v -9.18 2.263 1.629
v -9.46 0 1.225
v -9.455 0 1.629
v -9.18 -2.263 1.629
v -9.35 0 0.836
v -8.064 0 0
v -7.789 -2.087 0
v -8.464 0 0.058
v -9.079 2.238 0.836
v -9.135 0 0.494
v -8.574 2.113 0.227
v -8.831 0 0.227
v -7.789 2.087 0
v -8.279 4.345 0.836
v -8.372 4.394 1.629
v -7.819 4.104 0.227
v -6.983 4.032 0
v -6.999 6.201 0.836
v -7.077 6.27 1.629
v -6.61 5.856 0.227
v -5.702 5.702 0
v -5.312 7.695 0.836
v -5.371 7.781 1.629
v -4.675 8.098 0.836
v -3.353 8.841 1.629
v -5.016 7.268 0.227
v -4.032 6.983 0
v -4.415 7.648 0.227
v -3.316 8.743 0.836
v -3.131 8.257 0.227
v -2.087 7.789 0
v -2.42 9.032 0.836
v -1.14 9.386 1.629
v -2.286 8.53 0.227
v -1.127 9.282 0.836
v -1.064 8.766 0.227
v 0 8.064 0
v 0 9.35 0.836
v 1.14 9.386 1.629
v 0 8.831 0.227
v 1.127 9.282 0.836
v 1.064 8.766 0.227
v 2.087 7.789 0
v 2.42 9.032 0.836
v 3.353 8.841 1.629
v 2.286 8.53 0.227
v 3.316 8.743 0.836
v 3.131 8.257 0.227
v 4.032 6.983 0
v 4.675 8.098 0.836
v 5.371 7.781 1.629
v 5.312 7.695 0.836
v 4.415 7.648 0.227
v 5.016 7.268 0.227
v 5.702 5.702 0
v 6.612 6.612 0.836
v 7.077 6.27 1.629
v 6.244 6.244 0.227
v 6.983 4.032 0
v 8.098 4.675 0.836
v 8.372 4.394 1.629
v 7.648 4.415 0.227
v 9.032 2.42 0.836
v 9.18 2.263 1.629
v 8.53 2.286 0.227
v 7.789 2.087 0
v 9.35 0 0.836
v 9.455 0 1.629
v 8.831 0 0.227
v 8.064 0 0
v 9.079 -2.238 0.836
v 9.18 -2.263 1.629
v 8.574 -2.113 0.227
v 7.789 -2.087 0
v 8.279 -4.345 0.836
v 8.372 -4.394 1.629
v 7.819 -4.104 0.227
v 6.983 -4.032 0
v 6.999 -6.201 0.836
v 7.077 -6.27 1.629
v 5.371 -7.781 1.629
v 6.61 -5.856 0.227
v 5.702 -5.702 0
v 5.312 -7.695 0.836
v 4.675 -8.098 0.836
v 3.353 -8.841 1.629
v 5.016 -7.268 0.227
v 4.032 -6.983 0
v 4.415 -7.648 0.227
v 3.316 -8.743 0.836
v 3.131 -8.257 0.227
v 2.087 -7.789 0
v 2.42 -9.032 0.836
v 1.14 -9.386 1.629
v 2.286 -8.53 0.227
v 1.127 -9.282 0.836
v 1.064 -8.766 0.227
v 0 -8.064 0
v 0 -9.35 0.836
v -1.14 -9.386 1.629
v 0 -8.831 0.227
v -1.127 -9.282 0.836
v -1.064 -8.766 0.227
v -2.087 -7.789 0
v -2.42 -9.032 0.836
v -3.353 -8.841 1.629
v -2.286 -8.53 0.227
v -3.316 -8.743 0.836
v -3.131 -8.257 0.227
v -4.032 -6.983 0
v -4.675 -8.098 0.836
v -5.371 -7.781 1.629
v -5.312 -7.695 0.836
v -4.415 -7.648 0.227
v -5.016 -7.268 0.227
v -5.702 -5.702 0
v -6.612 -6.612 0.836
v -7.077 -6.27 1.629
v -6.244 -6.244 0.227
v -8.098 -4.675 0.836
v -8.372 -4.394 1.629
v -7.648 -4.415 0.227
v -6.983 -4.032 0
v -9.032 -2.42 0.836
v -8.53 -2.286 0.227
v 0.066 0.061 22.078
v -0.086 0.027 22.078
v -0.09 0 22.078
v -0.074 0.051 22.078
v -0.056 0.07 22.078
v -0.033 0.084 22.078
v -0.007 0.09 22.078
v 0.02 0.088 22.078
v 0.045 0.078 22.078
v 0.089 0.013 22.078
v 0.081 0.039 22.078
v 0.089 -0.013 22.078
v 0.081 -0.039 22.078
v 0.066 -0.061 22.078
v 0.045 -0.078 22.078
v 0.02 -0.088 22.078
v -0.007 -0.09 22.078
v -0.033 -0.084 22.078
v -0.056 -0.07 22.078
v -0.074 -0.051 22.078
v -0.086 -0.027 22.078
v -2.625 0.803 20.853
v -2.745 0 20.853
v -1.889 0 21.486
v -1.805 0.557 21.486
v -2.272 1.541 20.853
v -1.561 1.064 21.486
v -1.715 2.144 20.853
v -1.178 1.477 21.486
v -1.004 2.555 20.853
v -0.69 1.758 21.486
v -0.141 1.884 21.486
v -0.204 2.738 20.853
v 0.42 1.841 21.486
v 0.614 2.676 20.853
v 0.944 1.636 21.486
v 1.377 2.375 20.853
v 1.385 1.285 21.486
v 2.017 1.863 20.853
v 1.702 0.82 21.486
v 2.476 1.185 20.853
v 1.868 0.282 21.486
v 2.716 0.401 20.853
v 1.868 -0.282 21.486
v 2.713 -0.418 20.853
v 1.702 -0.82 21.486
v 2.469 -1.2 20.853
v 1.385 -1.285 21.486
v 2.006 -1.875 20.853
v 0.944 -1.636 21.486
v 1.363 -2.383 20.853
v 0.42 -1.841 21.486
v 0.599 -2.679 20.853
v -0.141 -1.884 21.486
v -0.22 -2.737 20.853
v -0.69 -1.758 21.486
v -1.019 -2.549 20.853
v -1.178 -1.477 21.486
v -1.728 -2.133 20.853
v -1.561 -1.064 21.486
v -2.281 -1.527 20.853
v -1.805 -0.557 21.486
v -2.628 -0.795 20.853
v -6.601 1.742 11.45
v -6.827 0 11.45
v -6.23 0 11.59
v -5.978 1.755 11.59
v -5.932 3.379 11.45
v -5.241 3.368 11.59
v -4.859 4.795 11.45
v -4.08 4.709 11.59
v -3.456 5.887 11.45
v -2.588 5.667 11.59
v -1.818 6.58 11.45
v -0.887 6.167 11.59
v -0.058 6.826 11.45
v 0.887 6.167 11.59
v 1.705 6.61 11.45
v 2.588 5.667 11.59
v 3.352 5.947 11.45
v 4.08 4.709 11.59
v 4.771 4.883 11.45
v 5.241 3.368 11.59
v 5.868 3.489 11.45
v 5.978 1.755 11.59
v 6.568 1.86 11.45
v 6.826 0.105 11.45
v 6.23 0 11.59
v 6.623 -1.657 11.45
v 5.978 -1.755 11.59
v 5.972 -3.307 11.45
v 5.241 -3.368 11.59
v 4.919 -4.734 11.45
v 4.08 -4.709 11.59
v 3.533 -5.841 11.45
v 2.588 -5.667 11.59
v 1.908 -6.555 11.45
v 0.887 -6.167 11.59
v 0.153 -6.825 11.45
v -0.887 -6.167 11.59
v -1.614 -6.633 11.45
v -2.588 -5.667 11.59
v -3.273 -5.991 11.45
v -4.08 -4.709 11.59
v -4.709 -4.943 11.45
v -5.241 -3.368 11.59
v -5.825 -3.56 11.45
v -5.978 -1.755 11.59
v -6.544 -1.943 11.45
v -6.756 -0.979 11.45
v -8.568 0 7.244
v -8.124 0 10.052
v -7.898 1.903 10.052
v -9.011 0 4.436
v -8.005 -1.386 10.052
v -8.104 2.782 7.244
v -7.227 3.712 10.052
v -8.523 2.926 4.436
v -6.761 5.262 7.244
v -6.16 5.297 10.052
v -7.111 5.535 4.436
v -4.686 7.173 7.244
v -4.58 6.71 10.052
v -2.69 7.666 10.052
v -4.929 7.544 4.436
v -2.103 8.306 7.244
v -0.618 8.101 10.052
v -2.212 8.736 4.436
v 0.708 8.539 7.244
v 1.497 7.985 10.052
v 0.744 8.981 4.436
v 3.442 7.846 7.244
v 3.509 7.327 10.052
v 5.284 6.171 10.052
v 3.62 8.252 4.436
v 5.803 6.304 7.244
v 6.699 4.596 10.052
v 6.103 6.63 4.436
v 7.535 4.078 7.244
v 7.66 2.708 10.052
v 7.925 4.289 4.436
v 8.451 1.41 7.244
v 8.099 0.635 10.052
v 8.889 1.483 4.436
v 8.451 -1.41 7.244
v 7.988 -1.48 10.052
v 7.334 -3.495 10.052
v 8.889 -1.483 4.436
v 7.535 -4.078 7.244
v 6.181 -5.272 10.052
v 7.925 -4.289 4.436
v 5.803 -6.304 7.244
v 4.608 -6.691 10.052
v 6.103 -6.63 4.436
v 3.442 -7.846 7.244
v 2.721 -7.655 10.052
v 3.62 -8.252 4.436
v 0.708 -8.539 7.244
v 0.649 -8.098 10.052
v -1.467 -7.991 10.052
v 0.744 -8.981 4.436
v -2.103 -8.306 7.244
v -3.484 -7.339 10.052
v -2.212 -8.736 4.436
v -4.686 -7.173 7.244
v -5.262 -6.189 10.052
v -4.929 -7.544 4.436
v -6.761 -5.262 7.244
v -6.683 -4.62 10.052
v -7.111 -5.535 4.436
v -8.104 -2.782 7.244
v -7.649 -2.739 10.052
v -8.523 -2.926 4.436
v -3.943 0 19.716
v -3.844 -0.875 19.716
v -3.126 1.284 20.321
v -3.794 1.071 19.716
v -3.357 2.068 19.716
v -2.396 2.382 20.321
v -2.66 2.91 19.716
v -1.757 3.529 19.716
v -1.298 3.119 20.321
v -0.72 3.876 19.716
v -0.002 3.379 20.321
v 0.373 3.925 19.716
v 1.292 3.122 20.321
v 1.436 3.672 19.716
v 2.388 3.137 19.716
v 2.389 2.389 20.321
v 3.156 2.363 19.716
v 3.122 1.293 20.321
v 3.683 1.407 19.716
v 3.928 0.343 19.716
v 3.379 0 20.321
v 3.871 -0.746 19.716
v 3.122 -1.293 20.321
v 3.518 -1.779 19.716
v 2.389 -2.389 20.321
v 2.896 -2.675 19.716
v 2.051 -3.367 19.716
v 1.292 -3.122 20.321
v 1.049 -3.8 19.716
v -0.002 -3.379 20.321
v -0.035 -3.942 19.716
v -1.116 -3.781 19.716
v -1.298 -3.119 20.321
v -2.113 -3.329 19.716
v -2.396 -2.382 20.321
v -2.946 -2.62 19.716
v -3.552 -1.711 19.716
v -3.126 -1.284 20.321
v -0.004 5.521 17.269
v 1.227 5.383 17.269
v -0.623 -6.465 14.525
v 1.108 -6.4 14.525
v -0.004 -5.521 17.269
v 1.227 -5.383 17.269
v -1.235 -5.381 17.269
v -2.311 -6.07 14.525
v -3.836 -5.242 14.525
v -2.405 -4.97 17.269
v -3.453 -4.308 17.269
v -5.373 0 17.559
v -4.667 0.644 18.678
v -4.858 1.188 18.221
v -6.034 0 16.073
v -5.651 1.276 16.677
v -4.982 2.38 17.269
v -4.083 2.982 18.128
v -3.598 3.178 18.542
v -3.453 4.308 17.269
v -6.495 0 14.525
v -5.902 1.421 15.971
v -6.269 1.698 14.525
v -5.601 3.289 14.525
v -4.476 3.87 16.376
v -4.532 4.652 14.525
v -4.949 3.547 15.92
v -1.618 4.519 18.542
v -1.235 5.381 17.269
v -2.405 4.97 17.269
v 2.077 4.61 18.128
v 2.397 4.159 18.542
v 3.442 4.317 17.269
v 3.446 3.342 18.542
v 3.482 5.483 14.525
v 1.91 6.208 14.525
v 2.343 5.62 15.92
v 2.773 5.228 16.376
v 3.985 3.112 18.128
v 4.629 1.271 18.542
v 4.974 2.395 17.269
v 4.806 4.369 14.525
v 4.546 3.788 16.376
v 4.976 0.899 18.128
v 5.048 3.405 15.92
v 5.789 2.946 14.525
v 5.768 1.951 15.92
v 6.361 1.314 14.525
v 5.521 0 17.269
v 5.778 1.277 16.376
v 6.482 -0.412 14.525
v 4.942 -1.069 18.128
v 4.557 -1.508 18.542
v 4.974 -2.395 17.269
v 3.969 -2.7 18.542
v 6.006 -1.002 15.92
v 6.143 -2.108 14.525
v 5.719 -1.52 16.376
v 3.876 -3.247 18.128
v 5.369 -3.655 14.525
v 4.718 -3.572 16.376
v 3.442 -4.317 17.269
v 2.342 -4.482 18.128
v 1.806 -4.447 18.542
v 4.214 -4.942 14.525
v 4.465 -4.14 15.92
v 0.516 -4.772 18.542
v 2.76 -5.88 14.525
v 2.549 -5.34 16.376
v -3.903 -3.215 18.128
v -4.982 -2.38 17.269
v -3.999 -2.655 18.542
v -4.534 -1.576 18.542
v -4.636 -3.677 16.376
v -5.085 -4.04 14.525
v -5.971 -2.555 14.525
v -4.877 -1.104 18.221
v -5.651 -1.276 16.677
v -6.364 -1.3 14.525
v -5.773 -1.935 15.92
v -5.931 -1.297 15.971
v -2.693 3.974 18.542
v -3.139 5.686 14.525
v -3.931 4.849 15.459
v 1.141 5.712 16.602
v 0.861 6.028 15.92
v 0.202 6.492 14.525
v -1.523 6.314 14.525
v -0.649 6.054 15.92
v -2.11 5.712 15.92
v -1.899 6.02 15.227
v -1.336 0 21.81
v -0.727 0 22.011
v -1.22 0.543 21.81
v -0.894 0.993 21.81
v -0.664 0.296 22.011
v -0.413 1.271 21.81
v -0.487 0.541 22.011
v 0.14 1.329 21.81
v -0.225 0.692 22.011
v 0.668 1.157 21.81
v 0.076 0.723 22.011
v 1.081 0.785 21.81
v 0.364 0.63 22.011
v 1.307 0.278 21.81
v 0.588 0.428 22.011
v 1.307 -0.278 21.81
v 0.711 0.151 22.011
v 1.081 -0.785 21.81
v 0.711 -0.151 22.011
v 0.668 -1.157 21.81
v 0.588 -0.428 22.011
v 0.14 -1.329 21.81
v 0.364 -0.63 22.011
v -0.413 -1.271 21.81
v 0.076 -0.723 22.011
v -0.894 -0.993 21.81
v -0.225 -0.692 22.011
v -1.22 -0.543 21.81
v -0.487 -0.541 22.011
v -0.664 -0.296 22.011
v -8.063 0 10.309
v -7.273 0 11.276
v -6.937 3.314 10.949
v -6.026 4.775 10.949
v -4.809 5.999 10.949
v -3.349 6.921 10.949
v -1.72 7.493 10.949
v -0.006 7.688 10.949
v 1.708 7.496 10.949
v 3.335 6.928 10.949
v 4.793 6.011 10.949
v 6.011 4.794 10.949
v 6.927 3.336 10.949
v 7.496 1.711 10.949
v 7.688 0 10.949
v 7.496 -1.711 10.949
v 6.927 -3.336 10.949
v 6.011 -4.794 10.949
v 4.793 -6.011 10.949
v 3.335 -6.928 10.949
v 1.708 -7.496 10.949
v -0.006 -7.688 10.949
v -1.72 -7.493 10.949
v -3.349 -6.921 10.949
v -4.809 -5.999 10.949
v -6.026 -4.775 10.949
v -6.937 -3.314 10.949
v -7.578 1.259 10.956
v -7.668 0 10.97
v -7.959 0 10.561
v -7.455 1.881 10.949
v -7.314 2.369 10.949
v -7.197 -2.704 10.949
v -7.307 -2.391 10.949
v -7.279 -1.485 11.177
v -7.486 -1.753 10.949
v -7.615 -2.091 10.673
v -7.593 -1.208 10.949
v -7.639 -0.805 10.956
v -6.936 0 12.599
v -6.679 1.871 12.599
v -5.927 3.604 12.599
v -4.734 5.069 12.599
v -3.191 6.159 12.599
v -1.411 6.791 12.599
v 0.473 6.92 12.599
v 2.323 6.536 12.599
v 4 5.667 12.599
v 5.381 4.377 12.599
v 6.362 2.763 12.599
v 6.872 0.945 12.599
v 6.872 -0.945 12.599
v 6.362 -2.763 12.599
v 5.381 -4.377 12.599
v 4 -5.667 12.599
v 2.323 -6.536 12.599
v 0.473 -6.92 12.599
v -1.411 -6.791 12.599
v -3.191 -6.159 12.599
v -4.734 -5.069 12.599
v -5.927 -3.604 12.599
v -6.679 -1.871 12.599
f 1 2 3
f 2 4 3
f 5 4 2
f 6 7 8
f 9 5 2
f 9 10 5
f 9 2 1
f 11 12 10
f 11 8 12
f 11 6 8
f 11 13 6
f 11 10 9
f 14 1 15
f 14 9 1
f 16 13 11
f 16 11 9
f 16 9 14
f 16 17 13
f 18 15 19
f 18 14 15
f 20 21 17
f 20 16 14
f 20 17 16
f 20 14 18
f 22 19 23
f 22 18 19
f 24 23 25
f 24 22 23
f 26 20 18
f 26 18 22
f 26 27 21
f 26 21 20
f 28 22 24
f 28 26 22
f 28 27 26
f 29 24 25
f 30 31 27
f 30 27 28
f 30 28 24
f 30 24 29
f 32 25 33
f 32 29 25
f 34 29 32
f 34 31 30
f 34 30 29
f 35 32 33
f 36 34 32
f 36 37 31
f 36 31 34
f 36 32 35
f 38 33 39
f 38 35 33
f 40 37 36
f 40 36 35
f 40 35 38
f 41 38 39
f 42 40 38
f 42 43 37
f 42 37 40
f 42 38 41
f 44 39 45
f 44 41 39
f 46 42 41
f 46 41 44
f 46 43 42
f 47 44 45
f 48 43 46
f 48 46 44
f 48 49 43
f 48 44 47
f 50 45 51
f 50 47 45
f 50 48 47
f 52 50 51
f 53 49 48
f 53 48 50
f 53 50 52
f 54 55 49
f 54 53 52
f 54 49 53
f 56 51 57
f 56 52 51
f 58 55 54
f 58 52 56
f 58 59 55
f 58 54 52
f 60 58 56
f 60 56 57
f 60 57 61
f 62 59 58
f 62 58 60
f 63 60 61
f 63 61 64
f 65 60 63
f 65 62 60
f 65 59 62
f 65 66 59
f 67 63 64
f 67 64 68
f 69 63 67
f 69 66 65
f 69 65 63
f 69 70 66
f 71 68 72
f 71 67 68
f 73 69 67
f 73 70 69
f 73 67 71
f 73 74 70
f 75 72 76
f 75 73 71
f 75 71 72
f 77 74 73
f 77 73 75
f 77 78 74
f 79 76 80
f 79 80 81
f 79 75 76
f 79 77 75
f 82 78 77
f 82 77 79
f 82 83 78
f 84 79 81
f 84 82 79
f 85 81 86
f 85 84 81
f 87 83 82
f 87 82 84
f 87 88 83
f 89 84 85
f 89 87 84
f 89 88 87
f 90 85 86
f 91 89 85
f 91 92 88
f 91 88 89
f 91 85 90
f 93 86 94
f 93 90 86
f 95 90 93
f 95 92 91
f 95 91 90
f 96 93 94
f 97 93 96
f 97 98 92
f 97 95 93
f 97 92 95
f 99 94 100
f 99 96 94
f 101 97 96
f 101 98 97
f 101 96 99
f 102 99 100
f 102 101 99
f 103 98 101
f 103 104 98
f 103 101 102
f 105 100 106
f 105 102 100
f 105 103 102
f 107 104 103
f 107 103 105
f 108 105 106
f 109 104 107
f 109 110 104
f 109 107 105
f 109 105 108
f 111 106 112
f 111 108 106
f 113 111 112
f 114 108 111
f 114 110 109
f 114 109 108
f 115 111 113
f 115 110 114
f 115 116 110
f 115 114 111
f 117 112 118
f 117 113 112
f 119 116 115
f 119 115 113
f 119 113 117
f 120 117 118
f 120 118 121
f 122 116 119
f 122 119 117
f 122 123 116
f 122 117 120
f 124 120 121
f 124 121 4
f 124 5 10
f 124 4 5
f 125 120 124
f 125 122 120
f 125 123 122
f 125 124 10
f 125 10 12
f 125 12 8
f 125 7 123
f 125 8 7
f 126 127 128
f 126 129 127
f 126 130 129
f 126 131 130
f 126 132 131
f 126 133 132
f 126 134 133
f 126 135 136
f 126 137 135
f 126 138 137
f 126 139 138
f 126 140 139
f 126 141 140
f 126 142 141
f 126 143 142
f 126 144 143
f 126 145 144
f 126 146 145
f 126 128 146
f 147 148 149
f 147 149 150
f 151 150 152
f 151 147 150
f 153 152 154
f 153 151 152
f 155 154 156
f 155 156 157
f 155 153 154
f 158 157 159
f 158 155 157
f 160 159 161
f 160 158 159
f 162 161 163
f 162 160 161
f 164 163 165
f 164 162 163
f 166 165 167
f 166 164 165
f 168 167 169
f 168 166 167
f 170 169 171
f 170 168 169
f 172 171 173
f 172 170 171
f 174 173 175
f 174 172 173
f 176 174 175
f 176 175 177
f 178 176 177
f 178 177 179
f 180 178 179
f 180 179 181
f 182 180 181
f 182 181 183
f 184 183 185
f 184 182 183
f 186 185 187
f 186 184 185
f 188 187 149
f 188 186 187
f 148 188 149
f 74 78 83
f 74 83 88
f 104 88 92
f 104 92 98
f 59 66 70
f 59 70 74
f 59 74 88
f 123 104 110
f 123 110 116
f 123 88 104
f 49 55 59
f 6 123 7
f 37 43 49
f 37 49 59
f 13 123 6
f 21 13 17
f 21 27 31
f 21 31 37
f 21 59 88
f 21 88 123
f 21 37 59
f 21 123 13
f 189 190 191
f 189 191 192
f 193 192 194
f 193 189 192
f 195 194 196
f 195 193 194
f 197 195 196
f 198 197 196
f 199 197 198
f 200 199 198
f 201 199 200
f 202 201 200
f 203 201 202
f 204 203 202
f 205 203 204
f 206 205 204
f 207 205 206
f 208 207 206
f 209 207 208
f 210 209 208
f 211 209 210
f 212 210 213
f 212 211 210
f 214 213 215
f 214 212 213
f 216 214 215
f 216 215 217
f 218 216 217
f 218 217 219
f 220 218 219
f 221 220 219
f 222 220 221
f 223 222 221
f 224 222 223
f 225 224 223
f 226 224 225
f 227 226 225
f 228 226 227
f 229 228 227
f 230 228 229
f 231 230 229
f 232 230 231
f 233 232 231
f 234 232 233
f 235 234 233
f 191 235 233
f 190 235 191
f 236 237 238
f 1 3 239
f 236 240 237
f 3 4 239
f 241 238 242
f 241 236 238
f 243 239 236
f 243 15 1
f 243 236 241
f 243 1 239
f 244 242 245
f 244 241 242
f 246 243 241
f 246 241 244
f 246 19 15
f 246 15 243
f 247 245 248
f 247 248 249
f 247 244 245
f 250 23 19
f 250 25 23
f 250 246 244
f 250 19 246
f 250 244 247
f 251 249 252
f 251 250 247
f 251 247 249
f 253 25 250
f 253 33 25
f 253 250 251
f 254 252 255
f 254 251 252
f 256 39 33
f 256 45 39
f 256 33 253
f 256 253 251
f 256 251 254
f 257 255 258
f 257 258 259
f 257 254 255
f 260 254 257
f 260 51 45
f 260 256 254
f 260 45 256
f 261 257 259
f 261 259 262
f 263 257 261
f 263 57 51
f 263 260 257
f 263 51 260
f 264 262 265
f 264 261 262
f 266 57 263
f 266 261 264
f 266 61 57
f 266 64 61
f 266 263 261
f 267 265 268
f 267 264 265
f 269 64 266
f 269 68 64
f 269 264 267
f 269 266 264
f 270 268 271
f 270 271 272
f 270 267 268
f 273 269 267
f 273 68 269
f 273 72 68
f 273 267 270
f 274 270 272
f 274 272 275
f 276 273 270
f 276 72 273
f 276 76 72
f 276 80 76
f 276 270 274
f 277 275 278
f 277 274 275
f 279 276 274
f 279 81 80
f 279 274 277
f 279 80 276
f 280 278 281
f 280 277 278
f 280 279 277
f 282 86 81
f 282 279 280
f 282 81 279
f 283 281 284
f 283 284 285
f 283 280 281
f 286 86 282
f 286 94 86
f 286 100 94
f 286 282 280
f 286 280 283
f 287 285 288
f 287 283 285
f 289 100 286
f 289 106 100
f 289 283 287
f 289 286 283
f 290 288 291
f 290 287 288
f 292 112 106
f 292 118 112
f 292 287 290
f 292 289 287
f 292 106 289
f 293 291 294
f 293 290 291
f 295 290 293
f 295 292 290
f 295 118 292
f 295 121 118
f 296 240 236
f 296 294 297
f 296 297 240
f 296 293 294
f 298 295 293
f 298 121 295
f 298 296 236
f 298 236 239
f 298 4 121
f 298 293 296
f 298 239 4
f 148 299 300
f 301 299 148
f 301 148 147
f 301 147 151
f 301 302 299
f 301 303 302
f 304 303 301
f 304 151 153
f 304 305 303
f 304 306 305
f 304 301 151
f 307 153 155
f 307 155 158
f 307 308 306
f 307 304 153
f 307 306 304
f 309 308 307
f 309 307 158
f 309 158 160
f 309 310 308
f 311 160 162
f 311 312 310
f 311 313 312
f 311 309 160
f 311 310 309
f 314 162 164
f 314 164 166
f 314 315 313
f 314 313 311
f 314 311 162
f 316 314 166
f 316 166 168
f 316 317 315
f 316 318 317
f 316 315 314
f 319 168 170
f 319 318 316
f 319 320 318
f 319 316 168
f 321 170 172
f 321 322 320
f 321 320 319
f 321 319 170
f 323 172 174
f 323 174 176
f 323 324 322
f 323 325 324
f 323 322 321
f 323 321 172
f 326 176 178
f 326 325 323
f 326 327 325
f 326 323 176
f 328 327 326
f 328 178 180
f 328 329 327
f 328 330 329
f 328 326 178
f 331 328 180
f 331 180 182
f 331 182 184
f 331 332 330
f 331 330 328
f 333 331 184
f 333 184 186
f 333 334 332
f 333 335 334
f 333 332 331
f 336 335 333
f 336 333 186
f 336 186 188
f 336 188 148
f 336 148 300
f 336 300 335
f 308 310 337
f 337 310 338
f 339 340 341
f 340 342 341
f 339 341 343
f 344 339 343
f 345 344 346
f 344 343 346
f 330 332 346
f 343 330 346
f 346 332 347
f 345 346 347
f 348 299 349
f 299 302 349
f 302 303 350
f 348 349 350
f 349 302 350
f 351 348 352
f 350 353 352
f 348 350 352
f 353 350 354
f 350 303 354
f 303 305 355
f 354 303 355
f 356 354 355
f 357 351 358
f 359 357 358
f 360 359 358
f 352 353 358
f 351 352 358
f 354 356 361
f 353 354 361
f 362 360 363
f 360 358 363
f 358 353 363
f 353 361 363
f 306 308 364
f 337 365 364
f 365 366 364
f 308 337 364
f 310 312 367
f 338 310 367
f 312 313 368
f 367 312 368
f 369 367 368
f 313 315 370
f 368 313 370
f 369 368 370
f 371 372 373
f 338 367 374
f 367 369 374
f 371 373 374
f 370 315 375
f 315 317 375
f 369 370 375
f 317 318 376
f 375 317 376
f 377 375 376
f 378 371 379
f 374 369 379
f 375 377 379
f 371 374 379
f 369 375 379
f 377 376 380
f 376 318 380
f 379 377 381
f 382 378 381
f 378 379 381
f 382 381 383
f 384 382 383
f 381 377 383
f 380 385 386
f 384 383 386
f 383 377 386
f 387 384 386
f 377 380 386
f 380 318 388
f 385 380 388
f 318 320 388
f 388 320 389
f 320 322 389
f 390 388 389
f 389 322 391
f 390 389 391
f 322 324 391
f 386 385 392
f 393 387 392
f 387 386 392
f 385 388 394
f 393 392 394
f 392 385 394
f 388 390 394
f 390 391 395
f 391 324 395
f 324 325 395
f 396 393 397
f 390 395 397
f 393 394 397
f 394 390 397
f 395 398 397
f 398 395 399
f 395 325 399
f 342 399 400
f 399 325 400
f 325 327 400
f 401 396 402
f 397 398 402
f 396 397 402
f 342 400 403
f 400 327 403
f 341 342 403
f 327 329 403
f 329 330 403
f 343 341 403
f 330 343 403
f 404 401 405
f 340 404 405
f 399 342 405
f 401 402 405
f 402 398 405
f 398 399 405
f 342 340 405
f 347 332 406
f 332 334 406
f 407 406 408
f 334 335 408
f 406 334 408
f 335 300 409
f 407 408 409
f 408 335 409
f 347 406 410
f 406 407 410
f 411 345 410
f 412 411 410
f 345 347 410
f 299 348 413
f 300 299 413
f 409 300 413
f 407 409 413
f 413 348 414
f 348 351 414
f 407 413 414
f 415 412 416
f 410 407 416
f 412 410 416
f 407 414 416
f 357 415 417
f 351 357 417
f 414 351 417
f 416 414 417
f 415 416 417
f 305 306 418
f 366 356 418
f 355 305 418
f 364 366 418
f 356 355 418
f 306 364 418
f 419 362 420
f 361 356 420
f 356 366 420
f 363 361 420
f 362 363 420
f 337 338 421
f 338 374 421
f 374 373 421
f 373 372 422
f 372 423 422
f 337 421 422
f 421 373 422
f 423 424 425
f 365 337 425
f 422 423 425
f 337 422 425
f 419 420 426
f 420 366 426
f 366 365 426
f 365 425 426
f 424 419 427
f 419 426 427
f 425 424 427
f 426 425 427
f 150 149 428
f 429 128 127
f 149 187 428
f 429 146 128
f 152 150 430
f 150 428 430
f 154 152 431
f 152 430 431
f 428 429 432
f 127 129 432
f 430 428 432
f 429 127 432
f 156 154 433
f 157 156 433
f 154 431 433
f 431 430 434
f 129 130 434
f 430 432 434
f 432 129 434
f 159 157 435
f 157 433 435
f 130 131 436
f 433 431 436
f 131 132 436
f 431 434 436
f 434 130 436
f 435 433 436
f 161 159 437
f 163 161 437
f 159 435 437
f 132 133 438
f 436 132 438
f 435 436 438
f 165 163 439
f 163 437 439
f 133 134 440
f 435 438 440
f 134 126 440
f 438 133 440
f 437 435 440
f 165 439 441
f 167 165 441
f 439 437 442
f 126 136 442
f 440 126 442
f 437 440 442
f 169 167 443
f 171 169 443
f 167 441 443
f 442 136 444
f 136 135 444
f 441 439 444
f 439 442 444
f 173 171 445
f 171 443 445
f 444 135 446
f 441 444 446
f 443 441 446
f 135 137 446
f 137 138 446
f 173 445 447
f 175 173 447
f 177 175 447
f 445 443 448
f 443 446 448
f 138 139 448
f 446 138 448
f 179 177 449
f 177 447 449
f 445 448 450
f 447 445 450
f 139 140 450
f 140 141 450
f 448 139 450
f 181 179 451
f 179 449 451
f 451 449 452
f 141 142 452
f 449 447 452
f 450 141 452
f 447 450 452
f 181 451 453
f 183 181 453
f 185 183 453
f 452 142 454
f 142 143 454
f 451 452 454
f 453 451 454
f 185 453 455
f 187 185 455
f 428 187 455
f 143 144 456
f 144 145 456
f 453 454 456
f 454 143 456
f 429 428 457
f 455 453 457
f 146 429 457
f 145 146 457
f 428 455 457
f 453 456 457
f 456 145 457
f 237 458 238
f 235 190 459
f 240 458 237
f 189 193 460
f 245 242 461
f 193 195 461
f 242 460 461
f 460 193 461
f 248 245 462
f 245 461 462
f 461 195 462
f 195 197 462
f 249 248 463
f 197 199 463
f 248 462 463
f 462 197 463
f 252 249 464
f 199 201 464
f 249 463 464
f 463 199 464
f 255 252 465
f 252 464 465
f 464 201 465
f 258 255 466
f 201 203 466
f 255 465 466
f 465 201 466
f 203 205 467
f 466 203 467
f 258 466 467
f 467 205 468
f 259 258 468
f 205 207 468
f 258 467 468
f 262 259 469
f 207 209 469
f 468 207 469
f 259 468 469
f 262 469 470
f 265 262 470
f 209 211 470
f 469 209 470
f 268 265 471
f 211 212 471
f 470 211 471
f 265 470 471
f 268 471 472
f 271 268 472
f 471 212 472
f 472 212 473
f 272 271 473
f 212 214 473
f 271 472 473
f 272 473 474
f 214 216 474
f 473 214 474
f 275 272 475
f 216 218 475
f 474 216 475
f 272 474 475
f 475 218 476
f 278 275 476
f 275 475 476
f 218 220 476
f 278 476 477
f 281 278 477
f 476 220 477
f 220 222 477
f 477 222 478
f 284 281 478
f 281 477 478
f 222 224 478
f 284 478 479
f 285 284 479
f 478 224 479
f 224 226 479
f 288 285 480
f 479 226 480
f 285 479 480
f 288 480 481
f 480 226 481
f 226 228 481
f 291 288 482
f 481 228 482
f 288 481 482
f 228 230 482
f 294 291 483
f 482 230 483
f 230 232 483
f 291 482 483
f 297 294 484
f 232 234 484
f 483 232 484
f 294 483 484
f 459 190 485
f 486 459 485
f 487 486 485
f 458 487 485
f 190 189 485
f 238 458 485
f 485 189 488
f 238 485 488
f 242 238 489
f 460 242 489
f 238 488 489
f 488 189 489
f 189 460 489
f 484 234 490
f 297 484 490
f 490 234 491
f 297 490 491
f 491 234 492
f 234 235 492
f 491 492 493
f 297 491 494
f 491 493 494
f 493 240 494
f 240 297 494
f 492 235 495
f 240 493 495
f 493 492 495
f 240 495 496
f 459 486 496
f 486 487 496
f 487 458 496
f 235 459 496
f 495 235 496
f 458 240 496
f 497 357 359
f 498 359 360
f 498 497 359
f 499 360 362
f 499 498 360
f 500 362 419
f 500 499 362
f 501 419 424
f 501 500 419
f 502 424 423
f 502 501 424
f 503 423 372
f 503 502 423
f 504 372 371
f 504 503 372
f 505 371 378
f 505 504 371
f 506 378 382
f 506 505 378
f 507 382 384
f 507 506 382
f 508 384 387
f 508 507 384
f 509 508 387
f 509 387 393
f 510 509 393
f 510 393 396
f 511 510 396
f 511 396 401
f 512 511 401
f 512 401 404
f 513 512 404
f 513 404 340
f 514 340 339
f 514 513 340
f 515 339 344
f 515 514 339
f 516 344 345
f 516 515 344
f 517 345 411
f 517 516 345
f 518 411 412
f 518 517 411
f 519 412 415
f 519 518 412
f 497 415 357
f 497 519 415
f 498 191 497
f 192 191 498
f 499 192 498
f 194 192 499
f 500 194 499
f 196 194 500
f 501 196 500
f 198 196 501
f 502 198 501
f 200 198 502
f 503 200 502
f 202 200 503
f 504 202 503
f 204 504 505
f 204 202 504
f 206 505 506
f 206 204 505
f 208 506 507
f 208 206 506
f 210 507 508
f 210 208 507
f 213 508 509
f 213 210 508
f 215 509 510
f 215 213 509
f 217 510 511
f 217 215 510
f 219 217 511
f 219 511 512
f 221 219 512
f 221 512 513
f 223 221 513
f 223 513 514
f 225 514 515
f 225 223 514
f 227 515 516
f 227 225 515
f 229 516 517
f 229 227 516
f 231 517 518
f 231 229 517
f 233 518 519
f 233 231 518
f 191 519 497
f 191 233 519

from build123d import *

# Parameters (mm, degrees)
F2_R = 12.599118
F3_R = 6.735102
F4_R = 3.026182
F5_R = 1.710135
F6_R = 1.408864


with BuildPart() as f1:
    # F0 (on Front) → F1 (revolve)
    with BuildSketch(Plane.XZ):
        Polygon((-9.7125, 0), (0, 0), (0, 22.078488), (-1.08705, 22.078488), (-3.406609, 20.364031), (-5.827018, 17.439371), (-6.936371, 12.598556), (-6.230419, 11.590051), (-7.944874, 11.18665), align=None)
    revolve(axis=Axis((0, 0, 11.039244), (0, 0, -1)))

    # F2
    f2_edges = [f1.edges().sort_by_distance(p)[0] for p in [
        (5.827018, 0, 17.439371),
    ]]
    fillet(f2_edges, radius=F2_R)

    # F3
    f3_edges = [f1.edges().sort_by_distance(p)[0] for p in [
        (3.406609, 0, 20.364031),
    ]]
    fillet(f3_edges, radius=F3_R)

    # F4
    f4_edges = [f1.edges().sort_by_distance(p)[0] for p in [
        (1.08705, 0, 22.078488),
    ]]
    fillet(f4_edges, radius=F4_R)

    # F5
    f5_edges = [f1.edges().sort_by_distance(p)[0] for p in [
        (7.944874, 0, 11.18665),
    ]]
    fillet(f5_edges, radius=F5_R)

    # F6
    f6_edges = [f1.edges().sort_by_distance(p)[0] for p in [
        (9.7125, 0, 0),
    ]]
    fillet(f6_edges, radius=F6_R)


solid = f1.part
